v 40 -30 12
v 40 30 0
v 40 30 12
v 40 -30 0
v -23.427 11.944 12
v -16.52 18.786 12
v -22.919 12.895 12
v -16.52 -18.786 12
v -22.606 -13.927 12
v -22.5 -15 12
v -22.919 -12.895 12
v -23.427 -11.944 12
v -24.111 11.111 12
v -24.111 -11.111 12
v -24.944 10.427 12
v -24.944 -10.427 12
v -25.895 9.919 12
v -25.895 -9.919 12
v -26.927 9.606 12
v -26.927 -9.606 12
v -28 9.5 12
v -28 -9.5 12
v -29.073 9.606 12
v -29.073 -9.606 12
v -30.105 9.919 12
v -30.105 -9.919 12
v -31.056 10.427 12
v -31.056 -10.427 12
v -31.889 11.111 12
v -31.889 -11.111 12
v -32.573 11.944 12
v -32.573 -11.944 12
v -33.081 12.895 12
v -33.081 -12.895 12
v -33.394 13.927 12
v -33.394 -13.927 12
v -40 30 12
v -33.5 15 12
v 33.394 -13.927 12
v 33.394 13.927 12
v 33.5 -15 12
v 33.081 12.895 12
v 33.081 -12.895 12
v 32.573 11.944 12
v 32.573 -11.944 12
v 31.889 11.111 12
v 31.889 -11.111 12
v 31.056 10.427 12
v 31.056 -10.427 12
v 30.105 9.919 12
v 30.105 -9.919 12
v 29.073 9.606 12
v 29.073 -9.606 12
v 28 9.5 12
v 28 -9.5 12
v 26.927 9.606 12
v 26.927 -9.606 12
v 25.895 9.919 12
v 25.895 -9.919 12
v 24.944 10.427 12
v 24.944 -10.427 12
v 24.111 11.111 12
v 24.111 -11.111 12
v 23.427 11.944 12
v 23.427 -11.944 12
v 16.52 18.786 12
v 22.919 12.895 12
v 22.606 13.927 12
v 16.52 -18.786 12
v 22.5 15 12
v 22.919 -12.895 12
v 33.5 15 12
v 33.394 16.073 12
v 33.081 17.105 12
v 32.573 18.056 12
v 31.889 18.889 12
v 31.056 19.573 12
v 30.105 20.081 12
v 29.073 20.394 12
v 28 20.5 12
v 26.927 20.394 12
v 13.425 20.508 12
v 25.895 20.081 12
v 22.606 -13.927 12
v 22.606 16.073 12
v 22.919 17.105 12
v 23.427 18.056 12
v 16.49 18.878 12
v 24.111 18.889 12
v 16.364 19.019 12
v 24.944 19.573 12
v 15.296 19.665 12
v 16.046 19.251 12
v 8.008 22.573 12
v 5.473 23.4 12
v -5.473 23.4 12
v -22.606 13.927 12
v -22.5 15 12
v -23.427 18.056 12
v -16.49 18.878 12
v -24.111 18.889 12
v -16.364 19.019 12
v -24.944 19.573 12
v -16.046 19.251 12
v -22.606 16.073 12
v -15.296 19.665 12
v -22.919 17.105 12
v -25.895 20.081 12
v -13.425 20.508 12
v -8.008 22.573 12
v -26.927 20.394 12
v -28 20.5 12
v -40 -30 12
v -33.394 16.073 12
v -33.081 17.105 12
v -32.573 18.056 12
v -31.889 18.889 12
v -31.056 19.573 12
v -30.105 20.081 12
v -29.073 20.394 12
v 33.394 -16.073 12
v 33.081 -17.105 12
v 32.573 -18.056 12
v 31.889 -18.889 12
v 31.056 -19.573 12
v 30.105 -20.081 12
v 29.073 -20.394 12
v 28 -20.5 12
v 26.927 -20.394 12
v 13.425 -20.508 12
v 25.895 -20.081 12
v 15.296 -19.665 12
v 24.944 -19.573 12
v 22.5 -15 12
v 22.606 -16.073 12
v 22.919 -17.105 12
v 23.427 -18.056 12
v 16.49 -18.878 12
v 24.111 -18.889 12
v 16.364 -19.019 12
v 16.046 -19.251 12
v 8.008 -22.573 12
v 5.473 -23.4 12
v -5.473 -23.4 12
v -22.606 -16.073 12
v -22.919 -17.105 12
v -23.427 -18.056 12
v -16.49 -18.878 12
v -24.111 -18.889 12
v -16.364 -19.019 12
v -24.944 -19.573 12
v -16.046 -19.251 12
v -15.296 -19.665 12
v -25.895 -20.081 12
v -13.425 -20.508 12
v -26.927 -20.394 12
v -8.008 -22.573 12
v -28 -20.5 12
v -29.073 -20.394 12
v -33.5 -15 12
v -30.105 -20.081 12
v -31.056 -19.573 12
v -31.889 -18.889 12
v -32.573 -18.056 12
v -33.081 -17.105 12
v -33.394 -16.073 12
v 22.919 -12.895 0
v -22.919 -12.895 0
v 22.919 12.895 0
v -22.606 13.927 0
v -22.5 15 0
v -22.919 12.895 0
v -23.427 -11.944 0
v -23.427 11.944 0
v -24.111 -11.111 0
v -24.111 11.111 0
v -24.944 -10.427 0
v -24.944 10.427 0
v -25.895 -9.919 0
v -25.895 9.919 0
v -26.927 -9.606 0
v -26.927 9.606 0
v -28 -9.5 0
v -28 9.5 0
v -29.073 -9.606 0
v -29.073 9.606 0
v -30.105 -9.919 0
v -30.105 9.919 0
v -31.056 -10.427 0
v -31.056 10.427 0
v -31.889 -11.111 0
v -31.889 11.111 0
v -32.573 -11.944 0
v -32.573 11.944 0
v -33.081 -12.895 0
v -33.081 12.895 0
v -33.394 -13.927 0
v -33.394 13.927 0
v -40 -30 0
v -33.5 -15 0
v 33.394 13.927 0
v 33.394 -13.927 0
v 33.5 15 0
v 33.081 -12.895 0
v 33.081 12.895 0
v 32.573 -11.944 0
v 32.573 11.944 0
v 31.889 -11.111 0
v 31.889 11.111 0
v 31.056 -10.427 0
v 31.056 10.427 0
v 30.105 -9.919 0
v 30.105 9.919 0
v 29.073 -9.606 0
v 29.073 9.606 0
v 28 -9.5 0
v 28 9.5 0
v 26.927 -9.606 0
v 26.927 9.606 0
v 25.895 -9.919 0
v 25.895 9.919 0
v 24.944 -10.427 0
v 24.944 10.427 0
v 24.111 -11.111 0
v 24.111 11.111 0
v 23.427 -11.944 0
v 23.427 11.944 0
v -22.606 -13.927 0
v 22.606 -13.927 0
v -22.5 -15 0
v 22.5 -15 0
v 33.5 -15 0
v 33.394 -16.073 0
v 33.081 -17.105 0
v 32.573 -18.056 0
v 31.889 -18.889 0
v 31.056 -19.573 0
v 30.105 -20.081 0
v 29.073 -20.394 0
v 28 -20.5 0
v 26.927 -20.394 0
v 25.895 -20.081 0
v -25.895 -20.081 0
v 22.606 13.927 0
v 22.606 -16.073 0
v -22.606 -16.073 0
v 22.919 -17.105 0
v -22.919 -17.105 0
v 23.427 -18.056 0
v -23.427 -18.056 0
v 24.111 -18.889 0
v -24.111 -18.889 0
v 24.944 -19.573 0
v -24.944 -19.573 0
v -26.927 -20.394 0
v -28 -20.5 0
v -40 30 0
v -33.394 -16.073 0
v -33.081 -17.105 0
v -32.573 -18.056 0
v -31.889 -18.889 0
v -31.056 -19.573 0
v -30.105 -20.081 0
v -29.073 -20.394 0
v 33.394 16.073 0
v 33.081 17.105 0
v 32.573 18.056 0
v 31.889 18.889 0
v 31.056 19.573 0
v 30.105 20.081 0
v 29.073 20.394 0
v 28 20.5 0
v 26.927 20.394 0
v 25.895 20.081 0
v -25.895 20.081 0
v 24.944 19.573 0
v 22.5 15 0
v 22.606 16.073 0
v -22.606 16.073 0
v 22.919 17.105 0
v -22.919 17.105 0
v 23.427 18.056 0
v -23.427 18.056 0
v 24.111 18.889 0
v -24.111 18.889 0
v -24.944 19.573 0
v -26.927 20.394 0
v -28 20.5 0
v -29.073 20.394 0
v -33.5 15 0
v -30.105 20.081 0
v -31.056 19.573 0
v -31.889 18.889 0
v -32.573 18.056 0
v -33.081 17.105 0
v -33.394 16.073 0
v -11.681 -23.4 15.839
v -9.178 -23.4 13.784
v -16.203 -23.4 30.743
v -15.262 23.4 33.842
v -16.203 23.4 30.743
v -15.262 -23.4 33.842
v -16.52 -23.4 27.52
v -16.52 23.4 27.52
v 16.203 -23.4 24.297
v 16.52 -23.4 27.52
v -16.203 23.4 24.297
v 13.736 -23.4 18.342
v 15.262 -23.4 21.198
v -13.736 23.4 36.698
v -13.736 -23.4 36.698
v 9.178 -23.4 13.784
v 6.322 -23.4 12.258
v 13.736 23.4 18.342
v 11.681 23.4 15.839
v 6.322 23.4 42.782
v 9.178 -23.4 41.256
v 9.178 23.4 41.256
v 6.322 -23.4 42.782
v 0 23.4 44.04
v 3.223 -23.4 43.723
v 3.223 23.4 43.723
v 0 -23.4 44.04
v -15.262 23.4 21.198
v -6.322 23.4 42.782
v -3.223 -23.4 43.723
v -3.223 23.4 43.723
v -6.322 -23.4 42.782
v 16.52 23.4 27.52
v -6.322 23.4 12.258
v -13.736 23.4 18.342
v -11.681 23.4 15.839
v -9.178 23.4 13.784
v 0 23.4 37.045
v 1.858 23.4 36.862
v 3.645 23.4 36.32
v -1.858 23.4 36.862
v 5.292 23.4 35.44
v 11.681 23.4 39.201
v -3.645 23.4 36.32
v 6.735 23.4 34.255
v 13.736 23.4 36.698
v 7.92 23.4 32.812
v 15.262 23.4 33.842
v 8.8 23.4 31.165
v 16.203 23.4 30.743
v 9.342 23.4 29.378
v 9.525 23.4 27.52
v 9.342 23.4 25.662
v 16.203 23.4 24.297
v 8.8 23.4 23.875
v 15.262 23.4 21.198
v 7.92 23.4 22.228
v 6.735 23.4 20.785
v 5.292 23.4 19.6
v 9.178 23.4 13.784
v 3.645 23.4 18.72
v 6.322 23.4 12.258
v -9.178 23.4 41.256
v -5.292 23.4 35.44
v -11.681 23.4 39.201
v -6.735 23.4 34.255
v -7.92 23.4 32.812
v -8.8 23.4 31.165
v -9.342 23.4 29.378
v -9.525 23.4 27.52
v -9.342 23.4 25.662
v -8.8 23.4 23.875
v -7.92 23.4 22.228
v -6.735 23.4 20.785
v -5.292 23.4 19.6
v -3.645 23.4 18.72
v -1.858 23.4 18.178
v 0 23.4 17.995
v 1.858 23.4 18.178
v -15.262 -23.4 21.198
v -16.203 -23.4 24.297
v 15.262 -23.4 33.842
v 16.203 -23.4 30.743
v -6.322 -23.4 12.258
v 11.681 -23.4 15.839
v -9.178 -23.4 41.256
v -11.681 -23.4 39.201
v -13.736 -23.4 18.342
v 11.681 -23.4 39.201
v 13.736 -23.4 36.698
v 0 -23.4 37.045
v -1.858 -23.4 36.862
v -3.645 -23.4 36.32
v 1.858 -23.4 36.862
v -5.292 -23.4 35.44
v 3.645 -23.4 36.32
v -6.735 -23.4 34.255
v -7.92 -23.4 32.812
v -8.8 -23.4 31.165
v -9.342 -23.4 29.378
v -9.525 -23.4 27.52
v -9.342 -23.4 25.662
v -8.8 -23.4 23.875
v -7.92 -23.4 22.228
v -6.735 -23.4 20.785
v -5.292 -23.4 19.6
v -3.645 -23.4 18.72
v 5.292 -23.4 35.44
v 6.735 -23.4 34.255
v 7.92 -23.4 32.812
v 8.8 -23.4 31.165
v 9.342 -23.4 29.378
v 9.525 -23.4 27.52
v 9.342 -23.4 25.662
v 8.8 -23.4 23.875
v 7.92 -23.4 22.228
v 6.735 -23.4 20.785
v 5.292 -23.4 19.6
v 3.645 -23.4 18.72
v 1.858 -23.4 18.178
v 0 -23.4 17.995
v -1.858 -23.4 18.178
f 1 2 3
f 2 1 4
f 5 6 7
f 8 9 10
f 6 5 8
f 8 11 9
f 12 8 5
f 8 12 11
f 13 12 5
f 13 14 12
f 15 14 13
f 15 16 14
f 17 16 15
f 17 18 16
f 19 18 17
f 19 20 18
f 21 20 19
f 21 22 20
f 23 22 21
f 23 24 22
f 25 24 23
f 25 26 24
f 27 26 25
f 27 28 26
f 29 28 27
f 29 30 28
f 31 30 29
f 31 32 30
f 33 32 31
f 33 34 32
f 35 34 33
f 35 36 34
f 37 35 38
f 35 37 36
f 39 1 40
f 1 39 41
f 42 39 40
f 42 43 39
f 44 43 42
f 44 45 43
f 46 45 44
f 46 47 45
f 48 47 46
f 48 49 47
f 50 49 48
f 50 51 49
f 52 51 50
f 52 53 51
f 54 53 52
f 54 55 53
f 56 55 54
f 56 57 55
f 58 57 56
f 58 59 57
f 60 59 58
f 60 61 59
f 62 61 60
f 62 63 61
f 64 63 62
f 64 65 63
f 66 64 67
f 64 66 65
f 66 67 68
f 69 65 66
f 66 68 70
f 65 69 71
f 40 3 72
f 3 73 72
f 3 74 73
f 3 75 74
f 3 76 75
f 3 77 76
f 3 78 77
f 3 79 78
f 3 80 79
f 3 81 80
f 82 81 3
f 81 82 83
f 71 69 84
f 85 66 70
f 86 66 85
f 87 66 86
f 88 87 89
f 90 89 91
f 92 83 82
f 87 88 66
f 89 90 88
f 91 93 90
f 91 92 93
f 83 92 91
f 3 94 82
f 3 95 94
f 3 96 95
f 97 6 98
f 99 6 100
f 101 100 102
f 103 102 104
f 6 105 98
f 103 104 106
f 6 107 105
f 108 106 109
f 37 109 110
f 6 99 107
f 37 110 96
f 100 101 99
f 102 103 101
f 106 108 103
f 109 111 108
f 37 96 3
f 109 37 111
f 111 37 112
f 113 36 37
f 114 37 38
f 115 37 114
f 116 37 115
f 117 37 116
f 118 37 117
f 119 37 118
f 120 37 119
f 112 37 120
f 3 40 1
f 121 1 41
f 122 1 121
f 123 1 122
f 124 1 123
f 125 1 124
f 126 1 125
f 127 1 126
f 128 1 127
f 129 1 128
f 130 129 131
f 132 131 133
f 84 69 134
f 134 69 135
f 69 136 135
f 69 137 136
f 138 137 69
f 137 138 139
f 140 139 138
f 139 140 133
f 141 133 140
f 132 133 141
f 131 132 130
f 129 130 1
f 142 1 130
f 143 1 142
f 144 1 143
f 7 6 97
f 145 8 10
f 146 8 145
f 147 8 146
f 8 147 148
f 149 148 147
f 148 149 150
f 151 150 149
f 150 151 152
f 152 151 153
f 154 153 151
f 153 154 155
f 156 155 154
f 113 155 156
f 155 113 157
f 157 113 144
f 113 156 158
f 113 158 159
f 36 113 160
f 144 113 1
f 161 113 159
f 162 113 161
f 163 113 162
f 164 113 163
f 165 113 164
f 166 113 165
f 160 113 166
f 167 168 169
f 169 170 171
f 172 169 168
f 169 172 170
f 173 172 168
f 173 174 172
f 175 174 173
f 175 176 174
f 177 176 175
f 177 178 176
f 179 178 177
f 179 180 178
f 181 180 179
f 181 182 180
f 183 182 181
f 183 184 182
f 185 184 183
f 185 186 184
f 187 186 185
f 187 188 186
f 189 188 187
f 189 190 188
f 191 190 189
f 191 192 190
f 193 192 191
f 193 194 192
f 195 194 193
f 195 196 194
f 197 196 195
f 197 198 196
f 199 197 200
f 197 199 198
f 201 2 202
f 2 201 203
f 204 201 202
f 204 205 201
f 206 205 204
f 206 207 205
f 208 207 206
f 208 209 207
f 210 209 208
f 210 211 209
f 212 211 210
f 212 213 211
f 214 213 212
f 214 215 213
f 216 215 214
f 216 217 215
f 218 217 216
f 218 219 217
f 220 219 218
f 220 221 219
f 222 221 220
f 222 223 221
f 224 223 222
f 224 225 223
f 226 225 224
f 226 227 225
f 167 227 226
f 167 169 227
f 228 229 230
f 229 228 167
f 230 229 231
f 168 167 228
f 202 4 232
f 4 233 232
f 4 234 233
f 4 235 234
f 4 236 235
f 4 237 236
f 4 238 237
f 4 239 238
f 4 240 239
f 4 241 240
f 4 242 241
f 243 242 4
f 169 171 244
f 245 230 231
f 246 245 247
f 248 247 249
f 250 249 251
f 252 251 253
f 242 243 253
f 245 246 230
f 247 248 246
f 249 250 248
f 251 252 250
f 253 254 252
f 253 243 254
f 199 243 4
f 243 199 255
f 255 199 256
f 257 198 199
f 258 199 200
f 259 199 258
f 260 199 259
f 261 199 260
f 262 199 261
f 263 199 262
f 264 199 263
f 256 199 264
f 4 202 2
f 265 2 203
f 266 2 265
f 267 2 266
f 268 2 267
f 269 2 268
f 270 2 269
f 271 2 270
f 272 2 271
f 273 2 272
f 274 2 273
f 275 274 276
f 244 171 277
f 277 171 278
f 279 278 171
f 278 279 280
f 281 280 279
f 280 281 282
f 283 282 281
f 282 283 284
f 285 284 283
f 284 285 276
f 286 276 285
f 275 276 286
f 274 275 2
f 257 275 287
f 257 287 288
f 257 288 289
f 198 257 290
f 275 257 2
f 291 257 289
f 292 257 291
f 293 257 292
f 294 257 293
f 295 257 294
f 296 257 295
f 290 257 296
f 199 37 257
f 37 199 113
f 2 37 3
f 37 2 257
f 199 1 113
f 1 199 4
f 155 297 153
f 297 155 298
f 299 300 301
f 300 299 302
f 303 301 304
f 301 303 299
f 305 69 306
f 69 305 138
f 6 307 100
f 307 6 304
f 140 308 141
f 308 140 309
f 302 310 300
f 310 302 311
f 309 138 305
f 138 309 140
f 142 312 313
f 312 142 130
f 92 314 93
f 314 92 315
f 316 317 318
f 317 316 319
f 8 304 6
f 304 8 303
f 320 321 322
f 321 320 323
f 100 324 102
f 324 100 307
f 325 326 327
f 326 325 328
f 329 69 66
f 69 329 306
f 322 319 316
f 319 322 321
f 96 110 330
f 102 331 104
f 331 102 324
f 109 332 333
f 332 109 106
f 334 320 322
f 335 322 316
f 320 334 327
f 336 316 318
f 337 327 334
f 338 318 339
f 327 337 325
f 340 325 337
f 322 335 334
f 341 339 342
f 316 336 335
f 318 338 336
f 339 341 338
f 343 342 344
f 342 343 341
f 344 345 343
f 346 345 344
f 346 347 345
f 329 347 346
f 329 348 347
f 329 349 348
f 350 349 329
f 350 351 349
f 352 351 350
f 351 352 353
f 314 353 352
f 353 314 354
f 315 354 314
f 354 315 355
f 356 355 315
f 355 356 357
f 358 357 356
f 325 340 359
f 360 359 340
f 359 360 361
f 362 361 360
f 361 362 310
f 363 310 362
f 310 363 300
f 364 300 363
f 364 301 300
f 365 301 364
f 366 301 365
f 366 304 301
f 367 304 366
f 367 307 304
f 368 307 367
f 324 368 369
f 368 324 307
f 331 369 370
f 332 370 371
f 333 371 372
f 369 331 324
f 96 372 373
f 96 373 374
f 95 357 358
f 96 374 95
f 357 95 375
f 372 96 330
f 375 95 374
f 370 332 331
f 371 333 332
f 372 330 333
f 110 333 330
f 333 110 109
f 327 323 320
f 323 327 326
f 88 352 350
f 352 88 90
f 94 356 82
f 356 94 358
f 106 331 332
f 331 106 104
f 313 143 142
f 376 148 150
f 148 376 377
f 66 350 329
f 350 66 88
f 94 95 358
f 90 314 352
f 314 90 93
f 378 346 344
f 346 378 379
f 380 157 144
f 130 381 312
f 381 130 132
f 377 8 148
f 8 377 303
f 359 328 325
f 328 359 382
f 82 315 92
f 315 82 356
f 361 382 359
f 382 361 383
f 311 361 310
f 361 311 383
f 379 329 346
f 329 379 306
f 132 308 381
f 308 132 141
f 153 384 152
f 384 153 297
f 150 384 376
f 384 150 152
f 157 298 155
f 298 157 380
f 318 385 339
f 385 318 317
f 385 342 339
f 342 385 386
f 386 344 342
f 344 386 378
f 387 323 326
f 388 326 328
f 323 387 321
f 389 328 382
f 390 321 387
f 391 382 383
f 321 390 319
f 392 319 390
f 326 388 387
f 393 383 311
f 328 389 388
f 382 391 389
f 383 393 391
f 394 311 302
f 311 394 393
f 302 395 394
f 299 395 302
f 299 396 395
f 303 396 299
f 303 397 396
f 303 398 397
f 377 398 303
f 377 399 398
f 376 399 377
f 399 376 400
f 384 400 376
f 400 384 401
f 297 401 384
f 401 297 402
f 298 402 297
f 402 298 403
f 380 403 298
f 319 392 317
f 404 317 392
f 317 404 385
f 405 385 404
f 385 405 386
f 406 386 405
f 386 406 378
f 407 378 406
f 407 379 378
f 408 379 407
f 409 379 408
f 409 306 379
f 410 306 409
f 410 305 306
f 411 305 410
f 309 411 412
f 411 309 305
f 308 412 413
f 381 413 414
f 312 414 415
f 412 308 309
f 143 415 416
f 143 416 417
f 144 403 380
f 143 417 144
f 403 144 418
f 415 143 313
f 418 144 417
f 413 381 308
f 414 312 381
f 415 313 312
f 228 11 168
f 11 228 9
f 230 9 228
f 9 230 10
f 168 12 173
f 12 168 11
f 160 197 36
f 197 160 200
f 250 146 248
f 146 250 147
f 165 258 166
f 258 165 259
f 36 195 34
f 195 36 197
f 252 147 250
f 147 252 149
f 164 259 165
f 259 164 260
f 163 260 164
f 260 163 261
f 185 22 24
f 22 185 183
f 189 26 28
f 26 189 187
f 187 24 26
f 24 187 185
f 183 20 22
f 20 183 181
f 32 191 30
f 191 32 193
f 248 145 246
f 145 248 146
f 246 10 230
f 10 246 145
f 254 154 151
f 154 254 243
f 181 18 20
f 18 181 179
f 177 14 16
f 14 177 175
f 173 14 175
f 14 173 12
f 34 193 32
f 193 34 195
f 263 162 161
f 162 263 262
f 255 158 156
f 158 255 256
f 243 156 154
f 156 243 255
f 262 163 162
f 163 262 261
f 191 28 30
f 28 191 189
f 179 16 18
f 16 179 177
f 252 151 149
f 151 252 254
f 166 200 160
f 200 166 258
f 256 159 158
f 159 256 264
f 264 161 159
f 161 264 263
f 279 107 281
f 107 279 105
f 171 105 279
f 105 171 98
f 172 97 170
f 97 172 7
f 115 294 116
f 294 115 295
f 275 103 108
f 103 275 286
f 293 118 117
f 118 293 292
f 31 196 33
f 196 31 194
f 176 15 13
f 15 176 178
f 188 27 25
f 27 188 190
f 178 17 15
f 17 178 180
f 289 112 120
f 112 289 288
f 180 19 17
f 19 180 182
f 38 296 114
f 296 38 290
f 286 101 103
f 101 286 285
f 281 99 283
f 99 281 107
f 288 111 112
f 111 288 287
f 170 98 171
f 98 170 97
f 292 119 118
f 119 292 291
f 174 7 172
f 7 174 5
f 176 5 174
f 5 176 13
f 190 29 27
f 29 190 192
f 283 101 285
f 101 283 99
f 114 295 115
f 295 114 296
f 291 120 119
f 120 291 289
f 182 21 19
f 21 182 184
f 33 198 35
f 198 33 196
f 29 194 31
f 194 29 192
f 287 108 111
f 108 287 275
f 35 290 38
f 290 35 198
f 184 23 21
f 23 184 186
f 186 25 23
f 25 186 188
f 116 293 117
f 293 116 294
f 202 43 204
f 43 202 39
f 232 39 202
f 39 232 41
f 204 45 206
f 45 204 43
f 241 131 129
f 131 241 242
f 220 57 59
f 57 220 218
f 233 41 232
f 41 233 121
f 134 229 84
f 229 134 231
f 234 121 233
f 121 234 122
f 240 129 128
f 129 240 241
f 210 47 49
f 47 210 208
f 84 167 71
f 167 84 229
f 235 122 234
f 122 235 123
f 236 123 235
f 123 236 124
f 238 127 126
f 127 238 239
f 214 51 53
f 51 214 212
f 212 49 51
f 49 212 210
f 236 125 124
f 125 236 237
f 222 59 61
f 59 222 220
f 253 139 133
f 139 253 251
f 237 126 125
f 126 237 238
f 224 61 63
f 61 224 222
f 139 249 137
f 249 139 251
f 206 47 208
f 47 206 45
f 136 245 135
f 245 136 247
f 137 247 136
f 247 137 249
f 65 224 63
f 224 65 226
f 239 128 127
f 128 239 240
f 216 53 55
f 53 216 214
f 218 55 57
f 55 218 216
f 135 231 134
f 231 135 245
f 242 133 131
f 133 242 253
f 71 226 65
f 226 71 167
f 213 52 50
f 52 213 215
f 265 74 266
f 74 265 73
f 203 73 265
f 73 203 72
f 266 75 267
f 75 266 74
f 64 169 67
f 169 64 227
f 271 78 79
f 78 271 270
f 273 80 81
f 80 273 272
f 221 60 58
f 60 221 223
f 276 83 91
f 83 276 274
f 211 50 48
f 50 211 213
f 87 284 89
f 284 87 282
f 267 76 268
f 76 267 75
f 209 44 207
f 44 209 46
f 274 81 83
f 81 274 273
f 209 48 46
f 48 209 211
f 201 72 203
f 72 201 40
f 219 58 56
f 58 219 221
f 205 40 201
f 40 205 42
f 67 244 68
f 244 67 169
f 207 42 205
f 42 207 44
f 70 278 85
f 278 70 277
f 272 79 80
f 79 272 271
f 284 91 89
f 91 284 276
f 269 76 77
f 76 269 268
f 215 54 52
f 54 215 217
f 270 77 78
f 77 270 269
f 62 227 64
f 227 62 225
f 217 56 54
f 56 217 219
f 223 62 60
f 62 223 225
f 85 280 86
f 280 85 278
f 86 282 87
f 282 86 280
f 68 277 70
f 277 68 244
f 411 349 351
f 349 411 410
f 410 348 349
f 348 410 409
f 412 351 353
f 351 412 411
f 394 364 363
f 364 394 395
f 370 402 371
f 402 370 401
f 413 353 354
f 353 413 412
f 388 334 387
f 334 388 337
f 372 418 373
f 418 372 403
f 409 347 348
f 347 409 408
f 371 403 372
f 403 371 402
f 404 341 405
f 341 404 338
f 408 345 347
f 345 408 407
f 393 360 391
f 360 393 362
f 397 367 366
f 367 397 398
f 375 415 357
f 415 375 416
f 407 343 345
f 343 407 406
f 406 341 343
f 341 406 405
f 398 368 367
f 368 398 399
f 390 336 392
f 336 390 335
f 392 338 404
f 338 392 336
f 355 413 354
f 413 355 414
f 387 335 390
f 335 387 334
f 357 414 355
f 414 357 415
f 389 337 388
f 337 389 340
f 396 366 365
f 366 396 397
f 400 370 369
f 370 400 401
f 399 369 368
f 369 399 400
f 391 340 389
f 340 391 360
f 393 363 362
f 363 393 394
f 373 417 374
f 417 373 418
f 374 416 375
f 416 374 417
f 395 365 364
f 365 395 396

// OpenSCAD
$fn = 32;

// ----------------------------------------------------------------------
// Bearing block: 80 x 60 mm base, 19.05 mm bore at 27.52 mm
// ----------------------------------------------------------------------

// --- parameters (mm) ---
base_w = 80;              // base width
base_d = 60;              // base depth
base_t = 12;              // base thickness
bore_d = 19.05;           // shaft / bearing bore
house_r = 16.52;          // housing outer radius
house_len = 46.8;         // housing length along the shaft
foot_w = 33.04;           // foot width under the housing
foot_len = 36.8;          // foot length along the shaft
axis_z = 27.52;           // bore axis height above the base
holes_d = 11;             // mounting holes
hole_x = 28;              // mounting hole spacing

difference() {
  union() {
    /* base plate with its underside on z = 0 */
    translate([0, 0, base_t / 2]) cube([base_w, base_d, base_t], center = true);
    /* hull foot: a straight web blending into the round housing */
    hull() {
      translate([0, 0, base_t - 0.5]) cube([foot_w, foot_len, 1.6], center = true);
      translate([0, 0, axis_z]) rotate([-90, 0, 0]) cylinder(h = house_len, d = 2 * house_r, center = true);
    }
  }
  /* bore through the housing, 2.5 mm clear on both sides */
  translate([0, 0, axis_z]) rotate([-90, 0, 0]) cylinder(h = house_len + 5, d = bore_d, center = true);
  /* mounting holes through the base plate */
  for (hx = [-28, 28]) {
    for (hy = [-15, 15]) {
      translate([hx, hy, -2.5]) cylinder(h = base_t + 5, d = holes_d);
    }
  }
}
